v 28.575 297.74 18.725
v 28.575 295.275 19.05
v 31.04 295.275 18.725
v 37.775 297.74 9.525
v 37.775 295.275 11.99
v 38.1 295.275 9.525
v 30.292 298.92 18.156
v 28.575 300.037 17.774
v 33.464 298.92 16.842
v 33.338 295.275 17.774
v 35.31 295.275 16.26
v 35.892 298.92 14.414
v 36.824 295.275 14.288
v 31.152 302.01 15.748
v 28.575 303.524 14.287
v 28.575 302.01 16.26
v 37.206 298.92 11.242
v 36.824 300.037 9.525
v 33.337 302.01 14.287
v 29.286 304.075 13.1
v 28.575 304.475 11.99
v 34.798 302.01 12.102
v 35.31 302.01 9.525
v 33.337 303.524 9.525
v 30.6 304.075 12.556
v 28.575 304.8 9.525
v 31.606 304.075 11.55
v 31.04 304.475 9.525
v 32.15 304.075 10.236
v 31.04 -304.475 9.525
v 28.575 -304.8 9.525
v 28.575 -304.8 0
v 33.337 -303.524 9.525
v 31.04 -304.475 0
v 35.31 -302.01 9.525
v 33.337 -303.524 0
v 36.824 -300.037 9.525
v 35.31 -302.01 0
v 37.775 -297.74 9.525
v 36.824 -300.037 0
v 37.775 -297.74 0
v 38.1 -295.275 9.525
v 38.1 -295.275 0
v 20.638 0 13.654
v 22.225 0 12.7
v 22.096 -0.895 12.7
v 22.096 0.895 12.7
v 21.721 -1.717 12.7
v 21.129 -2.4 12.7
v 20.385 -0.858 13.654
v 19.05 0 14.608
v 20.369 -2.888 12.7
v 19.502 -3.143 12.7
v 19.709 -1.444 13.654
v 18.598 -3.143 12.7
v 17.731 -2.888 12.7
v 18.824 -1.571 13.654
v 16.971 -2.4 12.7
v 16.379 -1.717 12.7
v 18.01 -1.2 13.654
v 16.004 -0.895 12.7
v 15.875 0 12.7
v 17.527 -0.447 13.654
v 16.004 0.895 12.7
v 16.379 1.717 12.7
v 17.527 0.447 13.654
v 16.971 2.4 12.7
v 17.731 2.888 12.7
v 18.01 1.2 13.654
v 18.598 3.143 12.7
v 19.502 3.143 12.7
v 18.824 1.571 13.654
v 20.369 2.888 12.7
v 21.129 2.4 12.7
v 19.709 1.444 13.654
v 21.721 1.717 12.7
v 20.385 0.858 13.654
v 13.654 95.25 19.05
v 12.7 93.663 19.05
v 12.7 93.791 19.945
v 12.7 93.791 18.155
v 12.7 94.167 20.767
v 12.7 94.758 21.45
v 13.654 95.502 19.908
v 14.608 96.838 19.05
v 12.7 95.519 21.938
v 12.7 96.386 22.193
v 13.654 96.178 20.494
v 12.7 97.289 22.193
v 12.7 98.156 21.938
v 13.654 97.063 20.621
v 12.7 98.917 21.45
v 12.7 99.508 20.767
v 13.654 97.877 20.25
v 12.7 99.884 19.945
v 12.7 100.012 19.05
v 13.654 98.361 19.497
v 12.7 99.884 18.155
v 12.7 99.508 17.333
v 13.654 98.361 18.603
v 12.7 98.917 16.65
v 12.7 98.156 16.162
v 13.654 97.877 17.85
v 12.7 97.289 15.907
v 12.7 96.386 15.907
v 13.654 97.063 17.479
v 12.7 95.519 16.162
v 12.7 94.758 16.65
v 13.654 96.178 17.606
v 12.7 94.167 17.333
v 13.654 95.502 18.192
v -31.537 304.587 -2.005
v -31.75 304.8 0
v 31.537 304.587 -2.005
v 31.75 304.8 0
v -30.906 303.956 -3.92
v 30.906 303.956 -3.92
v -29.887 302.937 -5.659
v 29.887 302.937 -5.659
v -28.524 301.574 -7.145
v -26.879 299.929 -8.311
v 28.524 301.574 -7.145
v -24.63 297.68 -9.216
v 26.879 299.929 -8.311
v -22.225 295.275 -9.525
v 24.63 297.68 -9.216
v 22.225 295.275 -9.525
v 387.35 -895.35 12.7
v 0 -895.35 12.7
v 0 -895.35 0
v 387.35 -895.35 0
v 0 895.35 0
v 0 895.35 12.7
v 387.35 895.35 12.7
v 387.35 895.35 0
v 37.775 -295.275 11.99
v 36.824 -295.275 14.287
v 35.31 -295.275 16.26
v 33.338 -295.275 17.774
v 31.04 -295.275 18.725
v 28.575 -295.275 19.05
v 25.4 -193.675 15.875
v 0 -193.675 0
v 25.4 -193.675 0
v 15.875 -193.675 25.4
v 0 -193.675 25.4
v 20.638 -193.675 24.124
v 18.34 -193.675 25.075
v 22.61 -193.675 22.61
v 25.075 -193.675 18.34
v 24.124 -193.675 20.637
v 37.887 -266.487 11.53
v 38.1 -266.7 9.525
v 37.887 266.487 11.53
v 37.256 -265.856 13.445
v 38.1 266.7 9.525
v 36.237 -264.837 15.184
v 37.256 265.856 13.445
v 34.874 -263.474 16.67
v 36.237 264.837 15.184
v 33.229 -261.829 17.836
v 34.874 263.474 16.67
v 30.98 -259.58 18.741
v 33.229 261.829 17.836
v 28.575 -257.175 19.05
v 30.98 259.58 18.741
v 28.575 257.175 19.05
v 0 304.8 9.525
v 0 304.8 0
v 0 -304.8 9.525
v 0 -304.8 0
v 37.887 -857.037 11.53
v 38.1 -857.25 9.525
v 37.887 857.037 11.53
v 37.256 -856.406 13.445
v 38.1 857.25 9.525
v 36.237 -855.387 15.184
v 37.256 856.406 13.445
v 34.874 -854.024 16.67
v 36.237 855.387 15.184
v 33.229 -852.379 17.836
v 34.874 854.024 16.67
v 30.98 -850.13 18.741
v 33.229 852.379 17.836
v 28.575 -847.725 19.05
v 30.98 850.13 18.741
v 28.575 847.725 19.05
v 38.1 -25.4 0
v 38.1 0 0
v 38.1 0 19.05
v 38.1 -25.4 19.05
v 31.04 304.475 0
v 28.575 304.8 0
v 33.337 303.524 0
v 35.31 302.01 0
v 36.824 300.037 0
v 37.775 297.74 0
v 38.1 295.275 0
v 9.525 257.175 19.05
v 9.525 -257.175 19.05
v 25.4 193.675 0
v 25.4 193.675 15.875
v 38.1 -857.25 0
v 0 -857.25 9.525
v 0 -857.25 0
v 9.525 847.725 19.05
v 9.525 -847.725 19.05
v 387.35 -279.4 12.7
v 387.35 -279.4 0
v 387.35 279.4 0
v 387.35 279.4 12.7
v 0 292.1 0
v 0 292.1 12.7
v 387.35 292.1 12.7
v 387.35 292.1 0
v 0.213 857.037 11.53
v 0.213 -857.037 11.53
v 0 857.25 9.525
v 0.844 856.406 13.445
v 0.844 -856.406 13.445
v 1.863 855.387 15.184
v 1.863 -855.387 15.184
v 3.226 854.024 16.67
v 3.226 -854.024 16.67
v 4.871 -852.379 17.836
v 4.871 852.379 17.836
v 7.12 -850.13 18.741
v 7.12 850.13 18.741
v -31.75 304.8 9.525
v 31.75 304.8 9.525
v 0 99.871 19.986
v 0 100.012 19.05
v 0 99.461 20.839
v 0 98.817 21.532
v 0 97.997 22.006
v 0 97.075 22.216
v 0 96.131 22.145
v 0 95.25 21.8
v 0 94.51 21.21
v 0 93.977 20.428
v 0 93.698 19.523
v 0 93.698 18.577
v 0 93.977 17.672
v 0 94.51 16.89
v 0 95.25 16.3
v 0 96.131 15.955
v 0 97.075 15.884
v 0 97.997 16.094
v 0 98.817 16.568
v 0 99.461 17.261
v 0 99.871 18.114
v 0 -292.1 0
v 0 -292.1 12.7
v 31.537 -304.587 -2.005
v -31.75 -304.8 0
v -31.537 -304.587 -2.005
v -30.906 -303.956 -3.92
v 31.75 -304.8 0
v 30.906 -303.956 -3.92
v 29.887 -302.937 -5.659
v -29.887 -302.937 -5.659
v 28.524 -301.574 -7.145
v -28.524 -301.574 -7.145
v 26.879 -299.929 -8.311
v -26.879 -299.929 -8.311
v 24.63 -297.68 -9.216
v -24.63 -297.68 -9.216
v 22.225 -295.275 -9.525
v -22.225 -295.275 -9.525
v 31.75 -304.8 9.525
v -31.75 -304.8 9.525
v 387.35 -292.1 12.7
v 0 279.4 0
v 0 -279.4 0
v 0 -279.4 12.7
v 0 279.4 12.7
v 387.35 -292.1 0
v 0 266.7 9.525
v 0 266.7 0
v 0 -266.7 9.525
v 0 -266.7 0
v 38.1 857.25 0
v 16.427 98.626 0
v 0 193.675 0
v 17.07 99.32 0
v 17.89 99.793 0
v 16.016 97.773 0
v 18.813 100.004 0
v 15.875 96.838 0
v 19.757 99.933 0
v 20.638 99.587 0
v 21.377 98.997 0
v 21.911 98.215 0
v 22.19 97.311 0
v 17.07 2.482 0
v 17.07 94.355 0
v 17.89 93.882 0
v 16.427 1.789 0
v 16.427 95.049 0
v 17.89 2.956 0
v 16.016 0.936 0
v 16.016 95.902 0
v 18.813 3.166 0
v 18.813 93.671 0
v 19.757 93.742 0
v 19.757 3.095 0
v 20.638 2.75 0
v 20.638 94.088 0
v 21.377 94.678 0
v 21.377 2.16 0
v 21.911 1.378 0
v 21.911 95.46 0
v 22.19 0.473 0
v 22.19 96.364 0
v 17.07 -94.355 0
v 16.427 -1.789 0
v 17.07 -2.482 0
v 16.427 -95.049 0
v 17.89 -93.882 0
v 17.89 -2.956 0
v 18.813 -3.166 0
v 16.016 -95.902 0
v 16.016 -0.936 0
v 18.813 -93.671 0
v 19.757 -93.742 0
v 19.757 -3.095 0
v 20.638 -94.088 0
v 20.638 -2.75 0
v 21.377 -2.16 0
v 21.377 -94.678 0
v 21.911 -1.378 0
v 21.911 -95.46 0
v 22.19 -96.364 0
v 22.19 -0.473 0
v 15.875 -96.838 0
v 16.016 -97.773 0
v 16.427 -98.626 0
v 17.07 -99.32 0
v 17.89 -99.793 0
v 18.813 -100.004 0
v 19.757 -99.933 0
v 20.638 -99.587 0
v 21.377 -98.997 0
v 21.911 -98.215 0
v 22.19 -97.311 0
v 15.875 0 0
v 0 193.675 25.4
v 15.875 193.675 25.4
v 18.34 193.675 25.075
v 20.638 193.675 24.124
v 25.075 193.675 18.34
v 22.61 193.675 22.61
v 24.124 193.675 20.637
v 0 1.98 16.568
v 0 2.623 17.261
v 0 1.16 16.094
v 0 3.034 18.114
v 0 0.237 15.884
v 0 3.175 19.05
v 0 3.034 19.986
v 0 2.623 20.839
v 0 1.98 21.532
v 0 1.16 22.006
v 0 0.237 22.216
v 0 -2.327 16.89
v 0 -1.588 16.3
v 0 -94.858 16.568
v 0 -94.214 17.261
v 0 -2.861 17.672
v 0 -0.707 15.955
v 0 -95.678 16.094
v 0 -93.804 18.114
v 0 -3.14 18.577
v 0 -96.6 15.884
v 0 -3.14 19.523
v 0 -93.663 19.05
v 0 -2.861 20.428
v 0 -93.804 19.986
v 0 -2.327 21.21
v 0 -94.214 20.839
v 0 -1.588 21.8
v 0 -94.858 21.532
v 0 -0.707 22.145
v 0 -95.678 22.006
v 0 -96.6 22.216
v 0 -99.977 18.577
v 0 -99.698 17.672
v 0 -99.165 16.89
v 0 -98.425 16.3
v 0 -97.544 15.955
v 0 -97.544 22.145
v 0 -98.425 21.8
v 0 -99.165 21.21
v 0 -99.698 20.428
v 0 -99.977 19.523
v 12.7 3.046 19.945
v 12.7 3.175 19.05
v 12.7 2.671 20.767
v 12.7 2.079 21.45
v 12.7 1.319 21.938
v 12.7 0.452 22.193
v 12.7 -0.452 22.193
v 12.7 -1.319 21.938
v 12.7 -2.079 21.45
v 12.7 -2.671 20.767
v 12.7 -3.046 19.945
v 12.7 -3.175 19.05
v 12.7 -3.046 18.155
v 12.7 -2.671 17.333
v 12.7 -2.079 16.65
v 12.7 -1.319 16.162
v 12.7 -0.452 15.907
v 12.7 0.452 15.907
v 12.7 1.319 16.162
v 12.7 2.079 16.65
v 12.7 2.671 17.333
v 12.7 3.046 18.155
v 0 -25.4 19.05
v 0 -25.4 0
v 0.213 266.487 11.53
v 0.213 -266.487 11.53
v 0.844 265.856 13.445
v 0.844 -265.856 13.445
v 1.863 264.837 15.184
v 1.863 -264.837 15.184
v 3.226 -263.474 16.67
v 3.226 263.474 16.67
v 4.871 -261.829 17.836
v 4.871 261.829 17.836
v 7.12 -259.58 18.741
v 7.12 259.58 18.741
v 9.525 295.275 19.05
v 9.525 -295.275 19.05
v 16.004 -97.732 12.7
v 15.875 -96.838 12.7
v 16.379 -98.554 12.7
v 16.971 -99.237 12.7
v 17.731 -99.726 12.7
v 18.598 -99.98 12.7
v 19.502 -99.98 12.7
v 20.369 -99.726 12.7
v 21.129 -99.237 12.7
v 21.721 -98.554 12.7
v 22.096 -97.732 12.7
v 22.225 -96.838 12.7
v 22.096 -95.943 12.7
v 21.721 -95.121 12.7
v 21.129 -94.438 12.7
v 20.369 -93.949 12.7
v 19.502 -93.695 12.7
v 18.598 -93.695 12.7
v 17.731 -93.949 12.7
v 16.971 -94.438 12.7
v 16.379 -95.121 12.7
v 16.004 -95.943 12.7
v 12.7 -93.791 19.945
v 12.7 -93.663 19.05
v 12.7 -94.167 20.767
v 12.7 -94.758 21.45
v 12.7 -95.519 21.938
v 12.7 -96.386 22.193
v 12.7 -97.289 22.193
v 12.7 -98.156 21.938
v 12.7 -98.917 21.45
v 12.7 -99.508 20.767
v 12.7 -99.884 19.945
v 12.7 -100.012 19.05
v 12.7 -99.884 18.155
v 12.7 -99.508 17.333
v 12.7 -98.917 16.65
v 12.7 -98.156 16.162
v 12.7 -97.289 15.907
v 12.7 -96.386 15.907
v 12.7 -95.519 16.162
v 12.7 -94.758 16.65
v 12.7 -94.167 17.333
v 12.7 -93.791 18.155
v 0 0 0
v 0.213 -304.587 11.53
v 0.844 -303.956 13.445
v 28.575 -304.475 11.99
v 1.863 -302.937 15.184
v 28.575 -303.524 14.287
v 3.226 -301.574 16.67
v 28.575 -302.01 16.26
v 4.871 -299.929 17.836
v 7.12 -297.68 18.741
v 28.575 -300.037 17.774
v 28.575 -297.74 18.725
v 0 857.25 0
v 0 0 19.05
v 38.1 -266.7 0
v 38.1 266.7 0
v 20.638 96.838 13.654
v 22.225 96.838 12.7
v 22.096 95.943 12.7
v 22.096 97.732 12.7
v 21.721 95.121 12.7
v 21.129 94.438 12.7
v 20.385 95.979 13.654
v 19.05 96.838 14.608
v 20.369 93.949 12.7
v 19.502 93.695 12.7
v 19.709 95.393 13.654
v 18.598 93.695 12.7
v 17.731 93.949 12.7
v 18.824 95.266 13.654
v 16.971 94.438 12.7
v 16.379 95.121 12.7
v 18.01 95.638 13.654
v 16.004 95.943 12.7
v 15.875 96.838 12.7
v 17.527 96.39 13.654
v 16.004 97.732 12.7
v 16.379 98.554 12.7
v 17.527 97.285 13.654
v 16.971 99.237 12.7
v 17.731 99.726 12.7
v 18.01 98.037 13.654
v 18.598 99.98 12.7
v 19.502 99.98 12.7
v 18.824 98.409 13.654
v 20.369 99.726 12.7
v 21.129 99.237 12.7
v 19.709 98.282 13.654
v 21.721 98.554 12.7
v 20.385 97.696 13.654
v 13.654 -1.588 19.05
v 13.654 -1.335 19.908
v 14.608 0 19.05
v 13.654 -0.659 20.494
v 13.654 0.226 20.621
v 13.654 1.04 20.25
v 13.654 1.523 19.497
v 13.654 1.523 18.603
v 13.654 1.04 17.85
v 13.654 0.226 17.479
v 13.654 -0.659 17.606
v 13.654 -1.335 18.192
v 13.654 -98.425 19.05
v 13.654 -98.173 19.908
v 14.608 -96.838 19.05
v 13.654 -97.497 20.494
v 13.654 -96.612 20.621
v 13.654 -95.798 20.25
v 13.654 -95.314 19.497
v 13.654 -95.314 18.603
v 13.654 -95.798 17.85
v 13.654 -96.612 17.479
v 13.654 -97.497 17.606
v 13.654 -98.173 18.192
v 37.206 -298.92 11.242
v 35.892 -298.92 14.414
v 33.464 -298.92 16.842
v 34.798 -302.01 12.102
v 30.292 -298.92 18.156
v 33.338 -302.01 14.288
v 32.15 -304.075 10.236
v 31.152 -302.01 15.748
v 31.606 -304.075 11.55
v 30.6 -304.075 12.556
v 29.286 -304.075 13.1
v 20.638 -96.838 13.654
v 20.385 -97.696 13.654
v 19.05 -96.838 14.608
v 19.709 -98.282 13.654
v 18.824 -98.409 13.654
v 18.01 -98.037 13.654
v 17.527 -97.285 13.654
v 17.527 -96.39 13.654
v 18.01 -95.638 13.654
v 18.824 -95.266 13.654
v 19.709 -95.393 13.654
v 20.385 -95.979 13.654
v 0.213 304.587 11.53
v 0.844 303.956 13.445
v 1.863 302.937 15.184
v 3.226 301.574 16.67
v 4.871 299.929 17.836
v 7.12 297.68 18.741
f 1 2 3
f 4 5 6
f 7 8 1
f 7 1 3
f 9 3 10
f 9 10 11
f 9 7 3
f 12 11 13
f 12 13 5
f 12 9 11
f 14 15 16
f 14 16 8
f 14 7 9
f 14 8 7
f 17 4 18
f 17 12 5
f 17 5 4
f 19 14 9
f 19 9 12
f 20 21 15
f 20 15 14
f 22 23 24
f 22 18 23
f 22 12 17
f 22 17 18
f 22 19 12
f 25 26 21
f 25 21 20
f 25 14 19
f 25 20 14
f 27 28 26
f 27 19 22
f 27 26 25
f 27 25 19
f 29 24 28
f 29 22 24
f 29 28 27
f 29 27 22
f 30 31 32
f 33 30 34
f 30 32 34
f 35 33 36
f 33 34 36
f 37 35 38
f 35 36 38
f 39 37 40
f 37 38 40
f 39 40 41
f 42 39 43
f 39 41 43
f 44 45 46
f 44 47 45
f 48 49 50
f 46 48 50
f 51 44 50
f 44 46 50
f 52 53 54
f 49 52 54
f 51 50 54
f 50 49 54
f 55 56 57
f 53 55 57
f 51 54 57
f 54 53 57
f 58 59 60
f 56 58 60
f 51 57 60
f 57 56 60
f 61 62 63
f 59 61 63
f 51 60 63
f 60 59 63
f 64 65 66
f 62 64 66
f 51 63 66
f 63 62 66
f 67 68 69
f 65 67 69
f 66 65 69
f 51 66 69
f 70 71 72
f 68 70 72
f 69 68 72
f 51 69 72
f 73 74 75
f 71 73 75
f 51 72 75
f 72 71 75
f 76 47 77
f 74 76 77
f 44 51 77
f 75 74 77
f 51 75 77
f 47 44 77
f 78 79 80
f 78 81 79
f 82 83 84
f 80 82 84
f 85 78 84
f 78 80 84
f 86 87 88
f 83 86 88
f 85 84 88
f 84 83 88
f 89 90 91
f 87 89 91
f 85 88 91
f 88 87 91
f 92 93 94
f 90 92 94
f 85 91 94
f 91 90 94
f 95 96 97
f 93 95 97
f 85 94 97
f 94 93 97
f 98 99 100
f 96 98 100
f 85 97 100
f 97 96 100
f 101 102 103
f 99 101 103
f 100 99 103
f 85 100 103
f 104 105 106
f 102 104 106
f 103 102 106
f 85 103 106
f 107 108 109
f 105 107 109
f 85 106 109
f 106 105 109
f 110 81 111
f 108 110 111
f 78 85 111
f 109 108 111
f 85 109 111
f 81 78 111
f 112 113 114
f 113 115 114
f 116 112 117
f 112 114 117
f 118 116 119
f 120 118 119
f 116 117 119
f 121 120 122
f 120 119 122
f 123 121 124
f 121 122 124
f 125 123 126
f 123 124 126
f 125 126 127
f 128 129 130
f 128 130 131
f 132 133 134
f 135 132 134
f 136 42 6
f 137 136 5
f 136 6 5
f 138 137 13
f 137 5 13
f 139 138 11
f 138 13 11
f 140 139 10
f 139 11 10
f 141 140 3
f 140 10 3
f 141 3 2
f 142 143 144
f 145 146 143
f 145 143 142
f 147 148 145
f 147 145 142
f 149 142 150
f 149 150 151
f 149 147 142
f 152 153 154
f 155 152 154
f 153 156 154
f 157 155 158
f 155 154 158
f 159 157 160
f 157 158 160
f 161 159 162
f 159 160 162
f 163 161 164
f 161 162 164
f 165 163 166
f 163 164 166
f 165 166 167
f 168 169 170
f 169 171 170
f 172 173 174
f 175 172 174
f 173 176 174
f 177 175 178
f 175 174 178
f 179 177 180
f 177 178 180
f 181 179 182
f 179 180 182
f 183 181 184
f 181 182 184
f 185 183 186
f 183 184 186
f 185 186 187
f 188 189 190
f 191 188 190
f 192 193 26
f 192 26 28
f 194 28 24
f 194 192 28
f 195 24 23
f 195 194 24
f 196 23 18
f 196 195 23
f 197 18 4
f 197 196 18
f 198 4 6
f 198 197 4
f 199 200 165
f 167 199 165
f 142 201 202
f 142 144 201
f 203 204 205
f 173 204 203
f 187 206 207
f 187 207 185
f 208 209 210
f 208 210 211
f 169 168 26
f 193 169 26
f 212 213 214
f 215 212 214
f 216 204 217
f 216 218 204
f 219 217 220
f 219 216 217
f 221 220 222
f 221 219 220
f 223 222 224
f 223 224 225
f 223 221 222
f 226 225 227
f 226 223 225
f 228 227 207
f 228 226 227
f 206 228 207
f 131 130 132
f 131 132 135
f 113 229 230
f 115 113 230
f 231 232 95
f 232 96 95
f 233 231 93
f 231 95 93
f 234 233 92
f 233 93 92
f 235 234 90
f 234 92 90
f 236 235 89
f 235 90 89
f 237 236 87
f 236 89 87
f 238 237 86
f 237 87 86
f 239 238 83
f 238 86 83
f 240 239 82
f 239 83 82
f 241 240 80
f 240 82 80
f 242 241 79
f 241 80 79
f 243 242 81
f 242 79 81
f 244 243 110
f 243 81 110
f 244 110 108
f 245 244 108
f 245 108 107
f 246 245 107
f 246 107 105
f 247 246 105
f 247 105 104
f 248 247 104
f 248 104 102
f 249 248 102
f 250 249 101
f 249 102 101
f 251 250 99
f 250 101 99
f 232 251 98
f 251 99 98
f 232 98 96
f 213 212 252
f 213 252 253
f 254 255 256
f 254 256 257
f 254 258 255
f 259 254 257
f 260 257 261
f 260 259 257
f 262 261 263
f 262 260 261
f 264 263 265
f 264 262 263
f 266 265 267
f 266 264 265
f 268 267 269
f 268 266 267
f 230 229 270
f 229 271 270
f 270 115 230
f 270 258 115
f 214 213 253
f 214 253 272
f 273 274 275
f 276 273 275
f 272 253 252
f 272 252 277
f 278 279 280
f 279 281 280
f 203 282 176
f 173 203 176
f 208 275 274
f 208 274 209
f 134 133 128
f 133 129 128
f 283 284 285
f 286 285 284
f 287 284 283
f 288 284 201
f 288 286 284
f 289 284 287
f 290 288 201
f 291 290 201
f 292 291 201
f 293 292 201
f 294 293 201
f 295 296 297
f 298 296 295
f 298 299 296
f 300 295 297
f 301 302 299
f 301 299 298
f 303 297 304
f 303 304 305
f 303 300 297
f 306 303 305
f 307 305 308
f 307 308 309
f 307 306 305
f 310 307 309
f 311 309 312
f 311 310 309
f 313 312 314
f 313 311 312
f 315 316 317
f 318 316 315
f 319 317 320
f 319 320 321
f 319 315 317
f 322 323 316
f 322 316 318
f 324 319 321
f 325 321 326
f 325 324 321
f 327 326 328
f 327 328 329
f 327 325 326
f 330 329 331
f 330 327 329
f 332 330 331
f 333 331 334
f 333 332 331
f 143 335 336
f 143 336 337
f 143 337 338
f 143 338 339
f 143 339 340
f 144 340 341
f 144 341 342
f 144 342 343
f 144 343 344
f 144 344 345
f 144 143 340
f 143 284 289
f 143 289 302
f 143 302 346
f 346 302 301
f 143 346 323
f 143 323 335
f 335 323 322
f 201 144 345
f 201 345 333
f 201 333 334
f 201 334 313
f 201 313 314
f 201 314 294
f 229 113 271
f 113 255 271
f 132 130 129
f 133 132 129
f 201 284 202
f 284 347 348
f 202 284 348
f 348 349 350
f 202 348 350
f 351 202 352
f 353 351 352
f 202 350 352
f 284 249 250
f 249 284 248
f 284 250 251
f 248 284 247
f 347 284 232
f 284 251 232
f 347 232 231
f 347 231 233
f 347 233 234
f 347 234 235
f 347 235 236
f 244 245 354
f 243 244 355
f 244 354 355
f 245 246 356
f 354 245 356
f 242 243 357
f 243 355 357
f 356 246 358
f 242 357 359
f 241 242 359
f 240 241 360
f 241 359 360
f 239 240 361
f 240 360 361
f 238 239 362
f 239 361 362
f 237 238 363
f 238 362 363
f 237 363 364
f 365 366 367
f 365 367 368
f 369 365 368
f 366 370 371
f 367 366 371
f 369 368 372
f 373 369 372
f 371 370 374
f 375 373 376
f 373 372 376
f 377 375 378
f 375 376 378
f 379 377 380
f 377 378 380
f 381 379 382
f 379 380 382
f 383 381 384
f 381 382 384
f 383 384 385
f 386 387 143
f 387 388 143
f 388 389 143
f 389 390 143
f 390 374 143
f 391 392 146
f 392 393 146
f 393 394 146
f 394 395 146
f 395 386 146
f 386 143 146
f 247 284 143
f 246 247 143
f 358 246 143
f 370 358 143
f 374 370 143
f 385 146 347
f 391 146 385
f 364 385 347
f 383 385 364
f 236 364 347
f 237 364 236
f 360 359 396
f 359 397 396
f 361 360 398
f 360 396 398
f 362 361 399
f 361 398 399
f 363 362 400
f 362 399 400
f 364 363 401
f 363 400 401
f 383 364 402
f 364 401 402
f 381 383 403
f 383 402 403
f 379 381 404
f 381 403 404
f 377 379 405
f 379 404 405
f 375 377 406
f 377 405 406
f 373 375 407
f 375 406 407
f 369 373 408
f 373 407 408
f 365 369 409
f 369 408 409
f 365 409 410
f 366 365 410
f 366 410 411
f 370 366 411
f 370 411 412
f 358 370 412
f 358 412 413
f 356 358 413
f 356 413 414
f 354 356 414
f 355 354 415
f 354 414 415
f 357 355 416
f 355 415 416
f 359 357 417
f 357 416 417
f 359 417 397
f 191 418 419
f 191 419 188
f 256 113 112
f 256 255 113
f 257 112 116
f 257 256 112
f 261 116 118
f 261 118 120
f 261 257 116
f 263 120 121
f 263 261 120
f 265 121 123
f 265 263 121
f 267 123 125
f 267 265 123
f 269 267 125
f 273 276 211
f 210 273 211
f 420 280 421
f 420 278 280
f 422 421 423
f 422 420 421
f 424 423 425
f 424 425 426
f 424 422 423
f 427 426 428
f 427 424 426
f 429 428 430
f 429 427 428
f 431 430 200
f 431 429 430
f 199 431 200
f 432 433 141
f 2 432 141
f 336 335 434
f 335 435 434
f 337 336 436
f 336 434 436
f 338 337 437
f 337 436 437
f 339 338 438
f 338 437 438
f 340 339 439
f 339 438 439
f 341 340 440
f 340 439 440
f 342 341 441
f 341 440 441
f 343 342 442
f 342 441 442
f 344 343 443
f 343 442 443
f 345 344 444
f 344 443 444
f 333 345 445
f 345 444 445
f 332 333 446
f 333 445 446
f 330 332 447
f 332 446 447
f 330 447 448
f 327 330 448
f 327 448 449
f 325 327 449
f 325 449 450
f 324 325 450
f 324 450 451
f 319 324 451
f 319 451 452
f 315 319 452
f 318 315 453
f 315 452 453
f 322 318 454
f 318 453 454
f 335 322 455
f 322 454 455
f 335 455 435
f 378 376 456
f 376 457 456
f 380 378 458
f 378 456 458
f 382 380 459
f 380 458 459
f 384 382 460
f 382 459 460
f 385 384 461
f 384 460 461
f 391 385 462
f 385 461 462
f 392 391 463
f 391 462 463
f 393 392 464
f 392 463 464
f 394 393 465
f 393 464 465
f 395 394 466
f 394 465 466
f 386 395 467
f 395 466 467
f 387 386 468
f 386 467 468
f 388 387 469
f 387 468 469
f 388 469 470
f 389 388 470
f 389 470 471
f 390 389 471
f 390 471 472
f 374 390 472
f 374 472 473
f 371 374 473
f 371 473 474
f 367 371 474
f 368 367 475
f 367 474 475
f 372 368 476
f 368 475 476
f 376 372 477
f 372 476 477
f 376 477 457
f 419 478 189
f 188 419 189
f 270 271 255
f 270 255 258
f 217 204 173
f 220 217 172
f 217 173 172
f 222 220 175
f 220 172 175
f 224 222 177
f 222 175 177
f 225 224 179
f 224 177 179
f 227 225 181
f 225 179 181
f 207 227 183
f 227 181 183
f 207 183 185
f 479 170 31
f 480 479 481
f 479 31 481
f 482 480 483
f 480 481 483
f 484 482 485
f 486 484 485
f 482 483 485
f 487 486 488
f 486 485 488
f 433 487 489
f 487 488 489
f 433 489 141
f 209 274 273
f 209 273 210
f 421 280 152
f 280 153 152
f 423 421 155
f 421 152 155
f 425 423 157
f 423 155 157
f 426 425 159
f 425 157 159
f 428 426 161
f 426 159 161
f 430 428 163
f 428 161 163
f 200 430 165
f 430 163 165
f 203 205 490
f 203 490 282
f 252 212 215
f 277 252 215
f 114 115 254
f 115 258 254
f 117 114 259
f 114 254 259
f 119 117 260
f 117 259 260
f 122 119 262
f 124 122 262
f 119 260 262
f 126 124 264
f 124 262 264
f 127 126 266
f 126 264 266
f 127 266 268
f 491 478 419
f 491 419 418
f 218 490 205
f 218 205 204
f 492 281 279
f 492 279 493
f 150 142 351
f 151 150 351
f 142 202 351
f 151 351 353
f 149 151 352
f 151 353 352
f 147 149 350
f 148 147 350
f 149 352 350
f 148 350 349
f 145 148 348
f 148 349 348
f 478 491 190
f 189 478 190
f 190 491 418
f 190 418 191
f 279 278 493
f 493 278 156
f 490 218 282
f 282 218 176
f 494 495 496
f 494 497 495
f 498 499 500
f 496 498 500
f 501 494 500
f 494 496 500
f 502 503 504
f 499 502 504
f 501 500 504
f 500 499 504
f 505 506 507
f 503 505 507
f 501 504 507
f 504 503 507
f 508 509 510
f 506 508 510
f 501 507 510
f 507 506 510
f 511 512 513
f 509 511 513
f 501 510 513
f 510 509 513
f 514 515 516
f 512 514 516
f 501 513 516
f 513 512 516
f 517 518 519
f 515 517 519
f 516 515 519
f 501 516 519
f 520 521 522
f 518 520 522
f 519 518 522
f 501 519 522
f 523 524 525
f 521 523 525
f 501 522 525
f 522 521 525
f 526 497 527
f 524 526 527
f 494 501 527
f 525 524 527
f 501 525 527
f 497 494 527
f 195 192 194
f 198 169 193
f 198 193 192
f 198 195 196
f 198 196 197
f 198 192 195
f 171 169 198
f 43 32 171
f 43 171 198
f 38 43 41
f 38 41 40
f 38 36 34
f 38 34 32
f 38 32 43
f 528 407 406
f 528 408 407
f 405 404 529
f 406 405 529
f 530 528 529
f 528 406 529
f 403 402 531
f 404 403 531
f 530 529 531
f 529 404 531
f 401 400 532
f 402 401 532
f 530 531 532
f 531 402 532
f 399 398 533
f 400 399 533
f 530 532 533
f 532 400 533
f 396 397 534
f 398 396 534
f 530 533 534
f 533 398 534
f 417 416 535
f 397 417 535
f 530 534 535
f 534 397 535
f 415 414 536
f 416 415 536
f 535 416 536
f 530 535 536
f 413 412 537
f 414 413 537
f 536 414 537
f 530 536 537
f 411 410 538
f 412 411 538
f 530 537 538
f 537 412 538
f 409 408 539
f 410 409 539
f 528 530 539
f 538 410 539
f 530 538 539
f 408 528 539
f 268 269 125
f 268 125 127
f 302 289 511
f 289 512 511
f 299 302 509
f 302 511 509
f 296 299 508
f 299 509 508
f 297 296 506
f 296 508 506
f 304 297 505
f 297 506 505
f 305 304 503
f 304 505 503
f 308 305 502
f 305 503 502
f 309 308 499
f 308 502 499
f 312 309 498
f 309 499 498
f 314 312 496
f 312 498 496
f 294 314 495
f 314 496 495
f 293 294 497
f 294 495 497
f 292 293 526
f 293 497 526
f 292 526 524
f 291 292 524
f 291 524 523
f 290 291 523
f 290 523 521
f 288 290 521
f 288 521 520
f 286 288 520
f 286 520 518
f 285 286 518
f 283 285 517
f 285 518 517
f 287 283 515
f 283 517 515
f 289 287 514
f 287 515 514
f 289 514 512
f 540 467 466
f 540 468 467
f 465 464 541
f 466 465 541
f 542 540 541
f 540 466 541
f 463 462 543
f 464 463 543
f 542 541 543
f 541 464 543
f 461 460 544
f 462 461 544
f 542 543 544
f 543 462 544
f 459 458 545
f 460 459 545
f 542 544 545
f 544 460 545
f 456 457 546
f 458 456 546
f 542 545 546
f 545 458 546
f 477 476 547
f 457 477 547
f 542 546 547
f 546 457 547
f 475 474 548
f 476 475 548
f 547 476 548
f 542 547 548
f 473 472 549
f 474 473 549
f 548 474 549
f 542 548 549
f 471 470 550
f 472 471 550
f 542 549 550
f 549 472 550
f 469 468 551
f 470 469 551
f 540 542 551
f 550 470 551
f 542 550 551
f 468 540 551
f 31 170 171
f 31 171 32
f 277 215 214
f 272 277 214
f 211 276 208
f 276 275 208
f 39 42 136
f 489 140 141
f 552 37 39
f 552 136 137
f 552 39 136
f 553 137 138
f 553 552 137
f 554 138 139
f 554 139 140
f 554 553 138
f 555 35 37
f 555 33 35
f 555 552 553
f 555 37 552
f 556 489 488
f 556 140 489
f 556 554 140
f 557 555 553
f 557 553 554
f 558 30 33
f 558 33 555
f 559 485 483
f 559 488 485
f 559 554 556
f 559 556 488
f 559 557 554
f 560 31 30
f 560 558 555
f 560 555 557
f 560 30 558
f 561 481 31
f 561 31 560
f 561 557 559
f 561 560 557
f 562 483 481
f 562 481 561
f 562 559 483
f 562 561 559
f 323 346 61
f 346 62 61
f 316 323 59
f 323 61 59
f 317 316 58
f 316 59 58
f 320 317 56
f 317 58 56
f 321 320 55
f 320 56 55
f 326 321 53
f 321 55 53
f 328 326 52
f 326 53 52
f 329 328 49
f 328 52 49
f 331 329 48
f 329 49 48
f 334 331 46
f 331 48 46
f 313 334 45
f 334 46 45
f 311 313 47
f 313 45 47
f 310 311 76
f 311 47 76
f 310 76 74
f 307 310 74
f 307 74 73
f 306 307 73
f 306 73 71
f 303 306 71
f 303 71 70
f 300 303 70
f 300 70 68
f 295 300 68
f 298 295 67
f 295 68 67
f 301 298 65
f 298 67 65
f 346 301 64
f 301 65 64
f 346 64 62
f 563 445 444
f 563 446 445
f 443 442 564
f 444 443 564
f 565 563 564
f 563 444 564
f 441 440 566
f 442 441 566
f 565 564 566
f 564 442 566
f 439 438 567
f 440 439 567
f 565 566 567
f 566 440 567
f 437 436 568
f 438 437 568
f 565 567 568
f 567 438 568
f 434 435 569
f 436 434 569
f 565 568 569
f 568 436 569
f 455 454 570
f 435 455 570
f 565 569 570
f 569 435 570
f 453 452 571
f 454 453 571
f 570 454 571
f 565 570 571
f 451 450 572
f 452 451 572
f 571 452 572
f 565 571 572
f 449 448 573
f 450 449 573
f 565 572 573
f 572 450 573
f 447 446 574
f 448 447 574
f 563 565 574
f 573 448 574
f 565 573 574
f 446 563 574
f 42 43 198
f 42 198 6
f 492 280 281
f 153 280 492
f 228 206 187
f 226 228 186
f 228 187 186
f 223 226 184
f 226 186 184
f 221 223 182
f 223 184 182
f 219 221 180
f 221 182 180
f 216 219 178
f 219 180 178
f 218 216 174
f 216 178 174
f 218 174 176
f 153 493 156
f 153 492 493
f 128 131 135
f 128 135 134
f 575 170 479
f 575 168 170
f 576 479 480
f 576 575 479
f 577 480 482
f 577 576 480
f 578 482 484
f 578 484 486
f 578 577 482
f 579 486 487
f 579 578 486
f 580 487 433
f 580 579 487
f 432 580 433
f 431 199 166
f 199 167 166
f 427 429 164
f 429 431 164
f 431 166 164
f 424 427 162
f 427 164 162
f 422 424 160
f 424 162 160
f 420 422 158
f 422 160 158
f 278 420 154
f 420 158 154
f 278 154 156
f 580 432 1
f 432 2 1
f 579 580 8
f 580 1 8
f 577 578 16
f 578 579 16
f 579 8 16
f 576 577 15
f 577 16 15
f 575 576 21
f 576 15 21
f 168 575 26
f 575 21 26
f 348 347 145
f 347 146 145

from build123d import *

# Parameters (mm, degrees)
F0_W          = 63.5
F0_H          = 19.05
F1_DEPTH      = 304.8
F2_R          = 9.525
F3_W          = 38.1
F3_H          = 19.05
F4_DEPTH      = 304.8
F5_R          = 9.525
F6_W          = 38.1
F6_H          = 19.05
F7_DEPTH      = 857.25
F8_R          = 9.525
F9_W          = 38.1
F9_H          = 19.05
F10_DEPTH     = 266.7
F11_R         = 9.525
F12_DEPTH     = 25.4
F13_W         = 25.4
F13_H         = 25.4
F14_DEPTH     = 193.675
F15_R         = 9.525
F17_D         = 6.35
F17_DEPTH     = 12.7
F17_TIP       = 1.9077324654
F19_D         = 6.35
F19_DEPTH     = 12.7
F19_TIP       = 1.9077324654
F20_T1_DEPTH  = 33.3375
F20_S5_W      = 9.525
F20_S5_H      = 9.525
F20_T6_DEPTH  = 9.525
F20_S11_W     = 9.525
F20_S11_H     = 9.525
F20_T12_DEPTH = 9.525
F21_W         = 387.35
F21_H         = 12.7
F22_DEPTH     = 279.4
F23_W         = 387.35
F23_H         = 12.7
F24_DEPTH     = 895.35
F25_W         = 387.35
F25_H         = 12.7
F26_DEPTH     = 292.1


# Not quite as in the source:
# - a fillet or chamfer that OpenCascade refuses, or shapes differently, is made with other operations: its cross-section is extruded or revolved along the edge and cut away or added


with BuildPart() as f1:
    # F0 (on Front) → F1 (new body, symmetric)
    with BuildSketch(Plane.XZ):
        Rectangle(F0_W, F0_H)
    extrude(amount=F1_DEPTH, both=True)

    # F2
    f2_edges = [f1.edges().sort_by_distance(p)[0] for p in [
        (31.75, 0, -9.525),
        (-31.75, 0, -9.525),
        (0, -304.8, -9.525),
        (0, 304.8, -9.525),
    ]]
    fillet(f2_edges, radius=F2_R)


with BuildPart() as f4:
    # F3 (on Front) → F4 (new body, symmetric)
    with BuildSketch(Plane.XZ):
        with Locations((19.05, 9.525)):
            Rectangle(F3_W, F3_H)
    extrude(amount=F4_DEPTH, both=True)

    # F5
    f5_edges = [f4.edges().sort_by_distance(p)[0] for p in [
        (38.1, 0, 19.05),
        (0, 0, 19.05),
        (19.05, -304.8, 19.05),
        (19.05, 304.8, 19.05),
    ]]
    fillet(f5_edges, radius=F5_R)

    # F20: fillet of radius 9.525 on 2 edges, made by hand

    # F20_s2 → F20_t1 (cut)
    with BuildSketch(Plane.XY.offset(-23.8125)):
        with BuildLine():
            ThreePointArc((28.575, -304.8), (35.3101920908, -302.0101920908), (38.1, -295.275))
            Line((38.1, -295.275), (38.1, -304.8))
            Line((38.1, -304.8), (28.575, -304.8))
        make_face()
        with BuildLine():
            ThreePointArc((28.575, 304.8), (35.3101920908, 302.0101920908), (38.1, 295.275))
            Line((38.1, 295.275), (38.1, 304.8))
            Line((38.1, 304.8), (28.575, 304.8))
        make_face()
    extrude(amount=F20_T1_DEPTH, mode=Mode.SUBTRACT)


with BuildPart() as f7:
    # F6 (on Front) → F7 (new body, symmetric)
    with BuildSketch(Plane.XZ):
        with Locations((19.05, 9.525)):
            Rectangle(F6_W, F6_H)
    extrude(amount=F7_DEPTH, both=True)

    # F8
    f8_edges = [f7.edges().sort_by_distance(p)[0] for p in [
        (38.1, 0, 19.05),
        (0, 0, 19.05),
        (19.05, -857.25, 19.05),
        (19.05, 857.25, 19.05),
    ]]
    fillet(f8_edges, radius=F8_R)


with BuildPart() as f10:
    # F9 (on Front) → F10 (new body, symmetric)
    with BuildSketch(Plane.XZ):
        with Locations((19.05, 9.525)):
            Rectangle(F9_W, F9_H)
    extrude(amount=F10_DEPTH, both=True)

    # F11
    f11_edges = [f10.edges().sort_by_distance(p)[0] for p in [
        (38.1, 0, 19.05),
        (0, 0, 19.05),
        (19.05, -266.7, 19.05),
        (19.05, 266.7, 19.05),
    ]]
    fillet(f11_edges, radius=F11_R)


with BuildPart() as f12:
    # F9 (on Front) → F12 (new body)
    with BuildSketch(Plane.XZ):
        with Locations((19.05, 9.525)):
            Rectangle(F9_W, F9_H)
    extrude(amount=F12_DEPTH)


with BuildPart() as f14:
    # F13 (on Front) → F14 (new body, symmetric)
    with BuildSketch(Plane.XZ):
        with Locations((12.7, 12.7)):
            Rectangle(F13_W, F13_H)
    extrude(amount=F14_DEPTH, both=True)

    # F15
    f15_edges = [f14.edges().sort_by_distance(p)[0] for p in [
        (25.4, 0, 25.4),
    ]]
    fillet(f15_edges, radius=F15_R)

    # F17
    with Locations(Plane(origin=(0, 0, 0), x_dir=(0, -1, 0), z_dir=(-1, 0, 0))):
        with Locations((-96.8375, 19.05), (0, 19.05), (96.8375, 19.05)):
            Hole(F17_D / 2, depth=F17_DEPTH)
            with Locations((0, 0, -(F17_DEPTH + F17_TIP / 2))):  # 118° drill point
                Cone(0, F17_D / 2, F17_TIP, mode=Mode.SUBTRACT)

    # F19
    with Locations(Plane(origin=(0, 0, 0), x_dir=(1, 0, 0), z_dir=(0, 0, -1))):
        with Locations((19.05, 96.8375), (19.05, 0), (19.05, -96.8375)):
            Hole(F19_D / 2, depth=F19_DEPTH)
            with Locations((0, 0, -(F19_DEPTH + F19_TIP / 2))):  # 118° drill point
                Cone(0, F19_D / 2, F19_TIP, mode=Mode.SUBTRACT)


with BuildPart() as f20_tool4:
    # F20_s5 → F20_t6 (new body)
    with BuildSketch(Plane.XZ.offset(-295.275)):
        with Locations((33.3375, 14.2875)):
            Rectangle(F20_S5_W, F20_S5_H)
    extrude(amount=-F20_T6_DEPTH)

    # F20_s7 → F20_t8 (revolve, cut)
    with BuildSketch(Plane(origin=(28.575, 295.275, 9.525), x_dir=(-0.7071067812, 0, -0.7071067812), z_dir=(0.7071067812, 0, -0.7071067812))):
        with BuildLine():
            ThreePointArc((0, -9.525), (9.525, 0), (0, 9.525))
            Line((0, 9.525), (0, -9.525))
        make_face()
    revolve(axis=Axis((28.575, 295.275, 9.525), (0, 1, 0)), mode=Mode.SUBTRACT)


with BuildPart() as f4_1:
    add(f4.part)

    # F20_t3: cut F20_tool4
    add(f20_tool4.part, mode=Mode.SUBTRACT)


with BuildPart() as f20_tool10:
    # F20_s11 → F20_t12 (new body)
    with BuildSketch(Plane.XZ.offset(295.275)):
        with Locations((33.3375, 14.2875)):
            Rectangle(F20_S11_W, F20_S11_H)
    extrude(amount=F20_T12_DEPTH)

    # F20_s13 → F20_t14 (revolve, cut)
    with BuildSketch(Plane(origin=(28.575, -295.275, 9.525), x_dir=(-0.7071067812, 0, -0.7071067812), z_dir=(-0.7071067812, 0, 0.7071067812))):
        with BuildLine():
            ThreePointArc((0, -9.525), (9.525, 0), (0, 9.525))
            Line((0, 9.525), (0, -9.525))
        make_face()
    revolve(axis=Axis((28.575, -295.275, 9.525), (0, -1, 0)), mode=Mode.SUBTRACT)


with BuildPart() as f4_2:
    add(f4_1.part)

    # F20_t9: cut F20_tool10
    add(f20_tool10.part, mode=Mode.SUBTRACT)


with BuildPart() as f22:
    # F21 (on Front) → F22 (new body, symmetric)
    with BuildSketch(Plane.XZ):
        with Locations((193.675, 6.35)):
            Rectangle(F21_W, F21_H)
    extrude(amount=F22_DEPTH, both=True)


with BuildPart() as f24:
    # F23 (on Front) → F24 (new body, symmetric)
    with BuildSketch(Plane.XZ):
        with Locations((193.675, 6.35)):
            Rectangle(F23_W, F23_H)
    extrude(amount=F24_DEPTH, both=True)


with BuildPart() as f26:
    # F25 (on Front) → F26 (new body, symmetric)
    with BuildSketch(Plane.XZ):
        with Locations((193.675, 6.35)):
            Rectangle(F25_W, F25_H)
    extrude(amount=F26_DEPTH, both=True)


solid = Compound([f1.part, f7.part, f10.part, f12.part, f14.part, f4_2.part, f22.part, f24.part, f26.part])
